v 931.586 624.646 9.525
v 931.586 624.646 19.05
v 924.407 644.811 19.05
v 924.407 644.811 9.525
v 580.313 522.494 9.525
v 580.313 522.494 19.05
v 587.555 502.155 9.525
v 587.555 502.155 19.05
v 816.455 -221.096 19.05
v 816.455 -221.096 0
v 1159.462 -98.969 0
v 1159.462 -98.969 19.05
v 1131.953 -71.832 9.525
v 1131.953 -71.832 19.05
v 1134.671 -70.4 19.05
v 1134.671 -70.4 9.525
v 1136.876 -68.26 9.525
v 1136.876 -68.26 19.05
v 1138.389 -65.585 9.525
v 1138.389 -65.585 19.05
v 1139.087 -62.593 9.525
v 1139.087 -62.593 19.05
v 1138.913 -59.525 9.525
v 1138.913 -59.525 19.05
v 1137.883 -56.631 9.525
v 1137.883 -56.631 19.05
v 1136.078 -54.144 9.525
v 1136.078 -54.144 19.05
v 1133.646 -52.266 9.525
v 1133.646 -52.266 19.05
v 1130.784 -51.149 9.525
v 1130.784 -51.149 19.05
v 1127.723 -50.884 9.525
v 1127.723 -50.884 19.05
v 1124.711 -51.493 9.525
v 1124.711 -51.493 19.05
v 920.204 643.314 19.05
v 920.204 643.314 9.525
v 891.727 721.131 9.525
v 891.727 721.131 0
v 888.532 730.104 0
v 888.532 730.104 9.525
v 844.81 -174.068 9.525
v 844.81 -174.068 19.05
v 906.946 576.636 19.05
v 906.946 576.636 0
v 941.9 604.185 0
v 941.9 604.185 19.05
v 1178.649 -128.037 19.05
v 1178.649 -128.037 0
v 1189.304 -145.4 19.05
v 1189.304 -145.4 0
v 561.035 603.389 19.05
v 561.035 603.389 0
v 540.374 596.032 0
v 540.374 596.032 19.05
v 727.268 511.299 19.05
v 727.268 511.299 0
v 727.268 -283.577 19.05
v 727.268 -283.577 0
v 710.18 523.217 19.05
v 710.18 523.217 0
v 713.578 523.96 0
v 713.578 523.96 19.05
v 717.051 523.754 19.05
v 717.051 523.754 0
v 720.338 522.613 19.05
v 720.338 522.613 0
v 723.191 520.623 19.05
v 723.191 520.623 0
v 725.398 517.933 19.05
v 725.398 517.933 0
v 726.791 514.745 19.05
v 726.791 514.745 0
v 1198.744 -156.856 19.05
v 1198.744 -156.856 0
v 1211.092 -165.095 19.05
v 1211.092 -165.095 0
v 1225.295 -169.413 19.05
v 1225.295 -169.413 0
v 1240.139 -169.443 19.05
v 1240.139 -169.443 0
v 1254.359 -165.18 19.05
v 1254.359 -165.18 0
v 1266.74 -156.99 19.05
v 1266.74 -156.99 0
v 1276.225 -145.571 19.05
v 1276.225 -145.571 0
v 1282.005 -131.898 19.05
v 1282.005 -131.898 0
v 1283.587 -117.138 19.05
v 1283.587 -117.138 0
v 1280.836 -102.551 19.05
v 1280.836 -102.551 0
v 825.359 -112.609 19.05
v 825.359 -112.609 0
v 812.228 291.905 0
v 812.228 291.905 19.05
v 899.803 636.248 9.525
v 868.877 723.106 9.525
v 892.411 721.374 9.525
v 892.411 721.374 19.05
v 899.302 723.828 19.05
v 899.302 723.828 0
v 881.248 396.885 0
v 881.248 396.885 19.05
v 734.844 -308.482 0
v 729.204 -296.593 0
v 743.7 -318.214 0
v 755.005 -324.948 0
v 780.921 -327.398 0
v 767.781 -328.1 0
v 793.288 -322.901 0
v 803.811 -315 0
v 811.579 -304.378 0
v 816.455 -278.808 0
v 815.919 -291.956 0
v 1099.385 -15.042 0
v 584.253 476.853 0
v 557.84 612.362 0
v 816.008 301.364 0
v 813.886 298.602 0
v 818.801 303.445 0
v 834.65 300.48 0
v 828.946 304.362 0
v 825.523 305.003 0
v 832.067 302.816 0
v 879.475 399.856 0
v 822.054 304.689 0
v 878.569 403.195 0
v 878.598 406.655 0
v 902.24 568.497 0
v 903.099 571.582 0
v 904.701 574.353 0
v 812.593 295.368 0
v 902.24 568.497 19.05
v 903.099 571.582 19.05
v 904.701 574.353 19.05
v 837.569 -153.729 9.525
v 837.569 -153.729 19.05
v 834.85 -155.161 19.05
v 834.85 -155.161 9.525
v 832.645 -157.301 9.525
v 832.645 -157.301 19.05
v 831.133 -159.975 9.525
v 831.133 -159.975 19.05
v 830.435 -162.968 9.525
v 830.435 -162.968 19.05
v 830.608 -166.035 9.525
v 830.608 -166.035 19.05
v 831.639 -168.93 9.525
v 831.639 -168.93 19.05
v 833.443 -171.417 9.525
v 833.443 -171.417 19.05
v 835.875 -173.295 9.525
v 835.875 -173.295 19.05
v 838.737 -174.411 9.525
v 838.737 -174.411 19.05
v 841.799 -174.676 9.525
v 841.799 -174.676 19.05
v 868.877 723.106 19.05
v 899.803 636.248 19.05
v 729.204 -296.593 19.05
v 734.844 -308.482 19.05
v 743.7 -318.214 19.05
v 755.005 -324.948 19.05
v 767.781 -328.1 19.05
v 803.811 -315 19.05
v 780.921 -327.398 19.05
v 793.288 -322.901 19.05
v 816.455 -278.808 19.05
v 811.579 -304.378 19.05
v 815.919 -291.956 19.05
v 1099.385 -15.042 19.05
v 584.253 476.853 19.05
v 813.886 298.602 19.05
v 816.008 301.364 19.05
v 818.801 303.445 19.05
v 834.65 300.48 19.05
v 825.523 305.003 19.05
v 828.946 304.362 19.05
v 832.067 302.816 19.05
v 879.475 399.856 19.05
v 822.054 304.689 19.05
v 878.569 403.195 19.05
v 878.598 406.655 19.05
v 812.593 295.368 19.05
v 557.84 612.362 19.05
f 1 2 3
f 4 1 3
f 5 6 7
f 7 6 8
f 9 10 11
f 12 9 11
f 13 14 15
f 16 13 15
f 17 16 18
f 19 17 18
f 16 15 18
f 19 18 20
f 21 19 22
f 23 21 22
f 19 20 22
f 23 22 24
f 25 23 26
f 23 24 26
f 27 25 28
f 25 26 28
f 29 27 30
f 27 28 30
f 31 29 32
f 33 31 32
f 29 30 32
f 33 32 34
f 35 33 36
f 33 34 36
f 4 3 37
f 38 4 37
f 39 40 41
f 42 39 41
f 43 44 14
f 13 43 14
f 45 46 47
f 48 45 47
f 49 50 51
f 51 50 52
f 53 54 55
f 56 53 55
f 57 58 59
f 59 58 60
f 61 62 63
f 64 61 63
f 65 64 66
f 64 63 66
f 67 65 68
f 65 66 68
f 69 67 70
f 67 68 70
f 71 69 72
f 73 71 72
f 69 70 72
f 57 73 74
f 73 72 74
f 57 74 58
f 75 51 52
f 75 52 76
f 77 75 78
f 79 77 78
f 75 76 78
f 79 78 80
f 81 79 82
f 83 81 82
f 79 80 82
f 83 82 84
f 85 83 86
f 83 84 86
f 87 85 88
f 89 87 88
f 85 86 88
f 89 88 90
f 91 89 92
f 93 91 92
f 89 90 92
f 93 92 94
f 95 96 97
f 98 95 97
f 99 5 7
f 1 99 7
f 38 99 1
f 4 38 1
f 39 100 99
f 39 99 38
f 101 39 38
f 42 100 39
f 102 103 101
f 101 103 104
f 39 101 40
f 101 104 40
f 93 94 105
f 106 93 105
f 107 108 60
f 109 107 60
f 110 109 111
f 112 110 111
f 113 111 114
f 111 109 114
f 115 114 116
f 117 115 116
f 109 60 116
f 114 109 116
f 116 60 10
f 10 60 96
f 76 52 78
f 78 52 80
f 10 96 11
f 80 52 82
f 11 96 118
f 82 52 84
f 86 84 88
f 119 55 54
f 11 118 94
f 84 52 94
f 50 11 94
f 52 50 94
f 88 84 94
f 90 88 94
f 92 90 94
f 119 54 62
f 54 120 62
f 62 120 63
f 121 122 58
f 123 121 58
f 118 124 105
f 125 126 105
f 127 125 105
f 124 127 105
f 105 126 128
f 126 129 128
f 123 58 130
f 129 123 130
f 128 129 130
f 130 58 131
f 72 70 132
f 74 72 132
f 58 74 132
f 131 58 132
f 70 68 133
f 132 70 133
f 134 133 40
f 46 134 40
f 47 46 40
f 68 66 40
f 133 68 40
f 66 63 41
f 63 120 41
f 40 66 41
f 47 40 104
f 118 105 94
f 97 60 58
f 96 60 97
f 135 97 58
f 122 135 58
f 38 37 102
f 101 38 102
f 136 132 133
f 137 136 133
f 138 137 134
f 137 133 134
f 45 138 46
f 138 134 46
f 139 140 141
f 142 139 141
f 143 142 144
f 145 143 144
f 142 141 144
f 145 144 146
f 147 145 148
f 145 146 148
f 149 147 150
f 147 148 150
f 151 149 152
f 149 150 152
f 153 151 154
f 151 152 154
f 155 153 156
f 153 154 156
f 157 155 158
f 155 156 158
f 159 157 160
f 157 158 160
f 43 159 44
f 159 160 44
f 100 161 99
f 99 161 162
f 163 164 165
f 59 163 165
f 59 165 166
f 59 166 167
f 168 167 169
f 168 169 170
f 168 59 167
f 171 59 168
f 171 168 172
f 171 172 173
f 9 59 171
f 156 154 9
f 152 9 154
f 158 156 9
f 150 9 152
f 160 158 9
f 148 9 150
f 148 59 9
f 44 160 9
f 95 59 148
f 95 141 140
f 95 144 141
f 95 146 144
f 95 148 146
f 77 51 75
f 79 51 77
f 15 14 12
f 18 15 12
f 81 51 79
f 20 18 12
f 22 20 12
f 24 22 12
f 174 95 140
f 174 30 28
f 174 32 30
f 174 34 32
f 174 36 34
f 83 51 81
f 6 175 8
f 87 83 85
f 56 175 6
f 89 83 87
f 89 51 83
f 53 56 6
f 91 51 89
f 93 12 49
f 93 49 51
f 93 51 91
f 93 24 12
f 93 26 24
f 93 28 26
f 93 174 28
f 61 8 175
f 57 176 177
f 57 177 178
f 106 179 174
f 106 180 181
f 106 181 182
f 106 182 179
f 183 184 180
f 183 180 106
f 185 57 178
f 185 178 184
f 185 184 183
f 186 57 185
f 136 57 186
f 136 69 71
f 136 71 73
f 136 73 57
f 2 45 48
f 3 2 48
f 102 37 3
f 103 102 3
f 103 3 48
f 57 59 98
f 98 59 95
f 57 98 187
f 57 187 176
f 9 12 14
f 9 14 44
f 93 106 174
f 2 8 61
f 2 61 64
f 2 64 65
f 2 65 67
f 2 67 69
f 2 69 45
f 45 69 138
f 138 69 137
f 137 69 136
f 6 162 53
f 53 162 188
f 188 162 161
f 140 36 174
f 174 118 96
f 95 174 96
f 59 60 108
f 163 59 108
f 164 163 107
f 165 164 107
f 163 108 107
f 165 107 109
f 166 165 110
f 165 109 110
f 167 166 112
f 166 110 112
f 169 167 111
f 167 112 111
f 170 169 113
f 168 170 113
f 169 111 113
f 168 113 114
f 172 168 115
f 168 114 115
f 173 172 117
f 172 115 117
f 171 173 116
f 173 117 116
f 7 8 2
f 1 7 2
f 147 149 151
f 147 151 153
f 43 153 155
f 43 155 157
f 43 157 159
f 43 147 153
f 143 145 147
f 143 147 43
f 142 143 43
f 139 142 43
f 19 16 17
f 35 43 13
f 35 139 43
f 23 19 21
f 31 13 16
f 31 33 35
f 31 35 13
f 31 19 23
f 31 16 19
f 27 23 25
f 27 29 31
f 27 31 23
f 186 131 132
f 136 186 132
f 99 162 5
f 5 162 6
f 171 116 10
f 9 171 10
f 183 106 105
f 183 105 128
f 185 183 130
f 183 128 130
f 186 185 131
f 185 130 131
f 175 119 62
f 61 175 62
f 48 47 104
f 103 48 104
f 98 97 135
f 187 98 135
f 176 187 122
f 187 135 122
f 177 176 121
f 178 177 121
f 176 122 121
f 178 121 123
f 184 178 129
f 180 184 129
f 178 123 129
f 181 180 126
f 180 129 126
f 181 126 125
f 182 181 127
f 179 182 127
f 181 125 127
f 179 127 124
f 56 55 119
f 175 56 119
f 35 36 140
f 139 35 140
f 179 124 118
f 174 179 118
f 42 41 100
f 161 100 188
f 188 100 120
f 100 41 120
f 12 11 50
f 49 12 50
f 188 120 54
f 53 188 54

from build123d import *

# Parameters (mm, degrees)
F1_DEPTH = 19.05
F3_DEPTH = 9.525
F5_DEPTH = 9.525


# Not quite as in the source:
# - a feature names something its author has since deleted; it is built from what else it names


with BuildPart() as f1:
    # F0 (on Top) → F1 (new body)
    with BuildSketch(Plane.XY):
        with BuildLine():
            Line((727.2677384075, 427.9083177516), (727.2677384075, -283.5772421425))
            ThreePointArc((727.2677384075, -283.5772421425), (774.3773382982, -328.2348347436), (816.4554812019, -278.8076674308))
            Line((816.4554812019, -278.8076674308), (816.4554812019, -221.0955097314))
            Line((816.4554812019, -221.0955097314), (1159.4623036636, -98.9686407408))
            Line((1159.4623036636, -98.9686407408), (1178.6487772739, -128.0367093729))
            Line((1178.6487772739, -128.0367093729), (1189.3036458742, -145.3996676047))
            ThreePointArc((1189.3036458742, -145.3996676047), (1254.3589120262, -165.180351508), (1280.8355912672, -102.5508970465))
            Line((1280.8355912672, -102.5508970465), (881.2480453078, 396.8848219998))
            ThreePointArc((881.2480453078, 396.8848219998), (878.9075846932, 401.4943033077), (878.5980767553, 406.6546597539))
            Line((878.5980767553, 406.6546597539), (902.2401524871, 568.497452094))
            ThreePointArc((902.2401524871, 568.497452094), (903.8120375637, 573.0182606597), (906.9455405898, 576.6362285378))
            Line((906.9455405898, 576.6362285378), (941.9003890149, 604.1852707886))
            Line((941.9003890149, 604.1852707886), (899.3018677789, 723.8279303566))
            Line((899.3018677789, 723.8279303566), (891.7270738587, 721.1309406639))
            Line((891.7270738587, 721.1309406639), (888.532184766, 730.1041401315))
            Line((888.532184766, 730.1041401315), (557.8398737201, 612.361827435))
            Line((557.8398737201, 612.361827435), (561.0347628128, 603.3886279674))
            Line((561.0347628128, 603.3886279674), (540.3738890749, 596.0323666485))
            Line((540.3738890749, 596.0323666485), (584.2529836062, 476.853404314))
            Line((584.2529836062, 476.853404314), (710.1798289544, 523.2169221936))
            ThreePointArc((710.1798289544, 523.2169221936), (721.8328450807, 521.7157540947), (727.2677384075, 511.2990259602))
            Line((727.2677384075, 511.2990259602), (727.2677384075, 427.9083177516))
        make_face()
        with BuildLine():
            Line((1099.3852571882, -15.0422832395), (825.3589785984, -112.6087723988))
            Line((825.3589785984, -112.6087723988), (812.2279623998, 291.9047427935))
            ThreePointArc((812.2279623998, 291.9047427935), (820.3847868922, 304.1789193457), (834.6503380579, 300.4798321914))
            Line((834.6503380579, 300.4798321914), (1099.3852571882, -15.0422832395))
        make_face(mode=Mode.SUBTRACT)
    extrude(amount=F1_DEPTH)

    # F2 (on face) → F3 (cut)
    with BuildSketch(Plane.XY.offset(19.05)):
        with BuildLine():
            ThreePointArc((837.5686180204, -153.7290348884), (831.0198662622, -167.5195352567), (844.8103666306, -174.068287015))
            Line((844.8103666306, -174.068287015), (1131.9527495937, -71.8318360485))
            ThreePointArc((1131.9527495937, -71.8318360485), (1138.501501352, -58.0413356801), (1124.7110009836, -51.4925839219))
            Line((1124.7110009836, -51.4925839219), (837.5686180204, -153.7290348884))
        make_face()
    extrude(amount=-F3_DEPTH, mode=Mode.SUBTRACT)

    # F4 (on face) → F5 (cut)
    with BuildSketch(Plane.XY.offset(19.05)):
        Polygon((580.3132639661, 522.4942656533), (587.5549912453, 502.1550059319), (931.5862417023, 624.6462138439), (924.4067217173, 644.8107569177), (920.2038128035, 643.3143248671), (892.0960137021, 722.2584502232), (888.9011246094, 731.2316496908), (868.5033081007, 724.1565396792), (899.8030168616, 636.2475531691), align=None)
    extrude(amount=-F5_DEPTH, mode=Mode.SUBTRACT)


solid = f1.part
